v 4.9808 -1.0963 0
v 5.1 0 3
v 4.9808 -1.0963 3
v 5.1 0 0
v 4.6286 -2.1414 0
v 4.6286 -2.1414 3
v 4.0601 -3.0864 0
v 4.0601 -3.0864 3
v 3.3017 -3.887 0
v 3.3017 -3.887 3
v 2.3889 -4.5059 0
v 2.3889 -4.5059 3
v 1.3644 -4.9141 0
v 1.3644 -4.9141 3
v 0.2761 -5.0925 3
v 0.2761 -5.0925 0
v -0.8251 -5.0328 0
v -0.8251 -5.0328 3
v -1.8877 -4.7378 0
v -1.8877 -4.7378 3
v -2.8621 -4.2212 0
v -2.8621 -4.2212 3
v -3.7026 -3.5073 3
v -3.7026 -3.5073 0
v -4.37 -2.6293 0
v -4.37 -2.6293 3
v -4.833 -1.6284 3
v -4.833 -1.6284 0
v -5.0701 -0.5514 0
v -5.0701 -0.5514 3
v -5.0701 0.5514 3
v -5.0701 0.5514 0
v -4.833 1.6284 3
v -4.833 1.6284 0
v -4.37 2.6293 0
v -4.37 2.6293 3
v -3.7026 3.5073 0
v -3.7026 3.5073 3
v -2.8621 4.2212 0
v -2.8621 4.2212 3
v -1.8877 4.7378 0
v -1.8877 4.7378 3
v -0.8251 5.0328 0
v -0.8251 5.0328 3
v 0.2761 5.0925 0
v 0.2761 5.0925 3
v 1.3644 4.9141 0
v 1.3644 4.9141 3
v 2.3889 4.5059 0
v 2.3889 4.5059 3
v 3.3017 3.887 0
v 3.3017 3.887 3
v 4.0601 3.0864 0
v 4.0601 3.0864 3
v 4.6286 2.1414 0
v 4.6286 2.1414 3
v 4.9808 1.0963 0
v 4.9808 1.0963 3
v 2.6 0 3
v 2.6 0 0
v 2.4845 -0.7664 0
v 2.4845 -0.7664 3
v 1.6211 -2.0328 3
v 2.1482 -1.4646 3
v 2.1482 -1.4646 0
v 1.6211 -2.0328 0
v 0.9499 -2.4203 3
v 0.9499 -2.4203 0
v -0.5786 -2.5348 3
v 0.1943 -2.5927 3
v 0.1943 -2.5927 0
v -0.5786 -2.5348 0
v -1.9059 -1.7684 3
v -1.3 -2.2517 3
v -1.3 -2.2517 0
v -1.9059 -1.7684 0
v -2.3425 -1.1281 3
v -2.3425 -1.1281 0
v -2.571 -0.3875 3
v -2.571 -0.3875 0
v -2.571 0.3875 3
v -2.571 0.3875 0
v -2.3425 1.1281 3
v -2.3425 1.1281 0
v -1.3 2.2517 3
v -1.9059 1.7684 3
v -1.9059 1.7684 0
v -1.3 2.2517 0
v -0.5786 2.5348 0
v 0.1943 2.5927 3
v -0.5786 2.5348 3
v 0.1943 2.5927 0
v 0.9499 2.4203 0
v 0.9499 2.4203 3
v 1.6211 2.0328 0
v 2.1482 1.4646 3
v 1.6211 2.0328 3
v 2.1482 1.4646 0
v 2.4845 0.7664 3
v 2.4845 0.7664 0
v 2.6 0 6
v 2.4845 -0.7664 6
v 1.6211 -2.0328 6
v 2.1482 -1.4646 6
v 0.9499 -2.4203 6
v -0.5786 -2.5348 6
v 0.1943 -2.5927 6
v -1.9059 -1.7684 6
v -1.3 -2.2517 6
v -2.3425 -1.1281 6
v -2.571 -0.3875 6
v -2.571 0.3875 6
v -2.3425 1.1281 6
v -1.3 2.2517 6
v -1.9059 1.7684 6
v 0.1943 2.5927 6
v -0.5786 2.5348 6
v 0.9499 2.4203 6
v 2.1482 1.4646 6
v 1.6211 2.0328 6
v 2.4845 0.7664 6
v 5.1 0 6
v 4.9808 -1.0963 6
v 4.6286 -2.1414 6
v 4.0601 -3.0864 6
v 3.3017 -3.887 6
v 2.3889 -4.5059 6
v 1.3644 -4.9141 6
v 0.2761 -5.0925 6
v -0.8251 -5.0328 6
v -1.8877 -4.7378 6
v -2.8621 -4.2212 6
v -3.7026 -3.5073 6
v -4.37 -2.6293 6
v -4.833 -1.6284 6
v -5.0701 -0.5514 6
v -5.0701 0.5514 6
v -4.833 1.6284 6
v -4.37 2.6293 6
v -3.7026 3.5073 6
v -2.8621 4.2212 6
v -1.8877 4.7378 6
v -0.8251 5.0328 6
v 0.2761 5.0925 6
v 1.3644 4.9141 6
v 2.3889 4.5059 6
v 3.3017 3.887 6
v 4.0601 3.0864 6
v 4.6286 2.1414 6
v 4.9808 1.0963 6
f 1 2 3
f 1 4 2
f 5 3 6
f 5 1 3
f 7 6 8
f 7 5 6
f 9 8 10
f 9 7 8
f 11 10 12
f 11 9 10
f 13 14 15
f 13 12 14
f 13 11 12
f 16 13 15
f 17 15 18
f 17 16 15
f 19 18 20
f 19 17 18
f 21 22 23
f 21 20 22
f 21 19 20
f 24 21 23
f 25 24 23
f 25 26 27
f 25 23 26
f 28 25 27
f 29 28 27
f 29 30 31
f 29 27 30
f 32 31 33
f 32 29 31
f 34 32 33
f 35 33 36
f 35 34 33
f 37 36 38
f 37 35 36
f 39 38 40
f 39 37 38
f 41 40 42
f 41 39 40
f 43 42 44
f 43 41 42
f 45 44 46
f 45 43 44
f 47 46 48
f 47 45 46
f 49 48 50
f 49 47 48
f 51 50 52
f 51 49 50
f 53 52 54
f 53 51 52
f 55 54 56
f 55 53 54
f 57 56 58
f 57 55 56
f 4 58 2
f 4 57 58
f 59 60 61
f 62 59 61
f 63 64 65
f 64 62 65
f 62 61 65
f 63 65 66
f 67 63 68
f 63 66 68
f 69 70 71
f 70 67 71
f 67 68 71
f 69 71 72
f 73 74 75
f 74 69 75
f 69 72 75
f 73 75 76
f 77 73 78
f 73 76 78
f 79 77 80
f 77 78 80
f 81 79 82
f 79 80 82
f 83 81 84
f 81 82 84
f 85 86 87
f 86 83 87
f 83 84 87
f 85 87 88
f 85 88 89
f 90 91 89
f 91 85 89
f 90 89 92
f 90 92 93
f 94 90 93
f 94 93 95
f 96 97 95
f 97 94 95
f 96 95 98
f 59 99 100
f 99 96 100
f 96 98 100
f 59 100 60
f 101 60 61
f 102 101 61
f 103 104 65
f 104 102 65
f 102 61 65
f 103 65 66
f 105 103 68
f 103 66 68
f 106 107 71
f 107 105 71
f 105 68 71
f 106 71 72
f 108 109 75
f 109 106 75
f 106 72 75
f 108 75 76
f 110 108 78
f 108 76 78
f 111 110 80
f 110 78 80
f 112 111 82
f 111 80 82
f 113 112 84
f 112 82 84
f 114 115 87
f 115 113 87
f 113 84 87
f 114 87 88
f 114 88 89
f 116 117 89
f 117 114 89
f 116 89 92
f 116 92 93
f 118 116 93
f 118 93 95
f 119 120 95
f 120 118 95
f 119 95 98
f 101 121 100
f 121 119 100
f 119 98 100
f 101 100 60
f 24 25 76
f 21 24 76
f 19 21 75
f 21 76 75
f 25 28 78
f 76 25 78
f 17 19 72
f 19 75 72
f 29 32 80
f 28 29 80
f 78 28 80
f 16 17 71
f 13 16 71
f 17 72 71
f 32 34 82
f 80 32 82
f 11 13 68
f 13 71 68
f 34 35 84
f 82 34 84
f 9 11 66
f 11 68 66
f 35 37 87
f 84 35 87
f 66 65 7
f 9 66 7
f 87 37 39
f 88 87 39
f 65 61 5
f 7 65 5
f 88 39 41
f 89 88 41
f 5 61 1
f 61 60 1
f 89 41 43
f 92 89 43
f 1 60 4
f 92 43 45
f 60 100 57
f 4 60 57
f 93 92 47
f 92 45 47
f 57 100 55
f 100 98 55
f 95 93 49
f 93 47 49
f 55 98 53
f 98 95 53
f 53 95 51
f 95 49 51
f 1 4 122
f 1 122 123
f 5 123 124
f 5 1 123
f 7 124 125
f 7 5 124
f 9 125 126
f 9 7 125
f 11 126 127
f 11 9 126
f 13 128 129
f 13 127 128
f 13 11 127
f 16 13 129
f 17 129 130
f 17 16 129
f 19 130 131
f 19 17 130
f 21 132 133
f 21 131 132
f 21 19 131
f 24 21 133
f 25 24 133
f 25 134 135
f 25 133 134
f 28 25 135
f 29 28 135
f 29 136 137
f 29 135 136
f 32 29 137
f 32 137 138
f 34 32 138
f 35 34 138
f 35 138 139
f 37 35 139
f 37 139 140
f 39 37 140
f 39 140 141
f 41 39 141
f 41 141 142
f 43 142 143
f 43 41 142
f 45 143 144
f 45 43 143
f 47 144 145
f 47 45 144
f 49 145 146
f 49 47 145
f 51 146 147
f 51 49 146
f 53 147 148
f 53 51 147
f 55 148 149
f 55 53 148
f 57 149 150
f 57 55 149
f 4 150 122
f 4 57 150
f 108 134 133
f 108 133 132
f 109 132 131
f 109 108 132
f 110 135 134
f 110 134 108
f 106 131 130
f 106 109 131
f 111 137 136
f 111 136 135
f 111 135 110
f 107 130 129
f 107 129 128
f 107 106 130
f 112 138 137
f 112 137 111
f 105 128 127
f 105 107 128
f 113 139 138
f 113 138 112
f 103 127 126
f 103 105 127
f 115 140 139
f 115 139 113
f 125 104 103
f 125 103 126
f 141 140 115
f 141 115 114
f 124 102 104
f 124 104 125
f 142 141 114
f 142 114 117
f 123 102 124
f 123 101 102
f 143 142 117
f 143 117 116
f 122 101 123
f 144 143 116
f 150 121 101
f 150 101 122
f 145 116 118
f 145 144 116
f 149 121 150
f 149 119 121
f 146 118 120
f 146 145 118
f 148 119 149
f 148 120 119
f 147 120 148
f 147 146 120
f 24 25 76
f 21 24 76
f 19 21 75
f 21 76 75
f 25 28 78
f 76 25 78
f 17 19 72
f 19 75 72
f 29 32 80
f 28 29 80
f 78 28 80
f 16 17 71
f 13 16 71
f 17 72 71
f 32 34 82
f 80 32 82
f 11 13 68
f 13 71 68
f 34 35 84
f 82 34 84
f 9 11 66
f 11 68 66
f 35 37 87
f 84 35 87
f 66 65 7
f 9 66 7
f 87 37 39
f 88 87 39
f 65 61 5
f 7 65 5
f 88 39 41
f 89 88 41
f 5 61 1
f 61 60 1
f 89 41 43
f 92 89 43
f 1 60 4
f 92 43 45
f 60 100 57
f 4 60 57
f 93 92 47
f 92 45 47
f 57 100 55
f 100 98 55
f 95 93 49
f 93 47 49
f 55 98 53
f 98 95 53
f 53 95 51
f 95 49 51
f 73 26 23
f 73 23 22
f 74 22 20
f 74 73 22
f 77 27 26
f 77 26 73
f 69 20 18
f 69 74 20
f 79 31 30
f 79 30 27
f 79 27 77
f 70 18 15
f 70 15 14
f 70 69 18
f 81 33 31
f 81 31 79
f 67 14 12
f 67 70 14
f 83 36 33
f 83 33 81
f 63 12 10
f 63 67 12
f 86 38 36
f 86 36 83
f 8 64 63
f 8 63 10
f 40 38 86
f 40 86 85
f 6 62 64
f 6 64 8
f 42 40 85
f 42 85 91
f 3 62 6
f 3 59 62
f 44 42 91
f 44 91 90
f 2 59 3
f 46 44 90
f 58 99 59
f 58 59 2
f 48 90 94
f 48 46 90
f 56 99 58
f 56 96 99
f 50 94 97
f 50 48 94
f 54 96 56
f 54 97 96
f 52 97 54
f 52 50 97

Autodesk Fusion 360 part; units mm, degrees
sketch "Sketch1" plane through (0, 0, 0) normal (0, 0, 1) x (1, 0, 0)
  circle A0 centre (0, 0) radius 2.6
  circle A1 centre (0, 0) radius 5.1
  dimension "d1" = 5.2
  dimension "d2" = 2.5
extrude "Extrude1" add sketch "Sketch1" along normal blind 3 makes body 1
extrude "Extrude2" add sketch "Sketch1" along normal blind 6 separate body makes body 2
copy_body "Body->Comp1" bodies 1 removing the originals makes body 3 in component "3MM SPACER"
copy_body "Body->Comp2" bodies 2 removing the originals makes body 4 in component "6MM SPACER"
component "3MM SPACER" placed x (1, 0, 0) y (0, 1, 0) z (0, 0, 1) at (0, 0, 0)
component "6MM SPACER" placed x (1, 0, 0) y (0, 1, 0) z (0, 0, 1) at (0, 0, 0)
